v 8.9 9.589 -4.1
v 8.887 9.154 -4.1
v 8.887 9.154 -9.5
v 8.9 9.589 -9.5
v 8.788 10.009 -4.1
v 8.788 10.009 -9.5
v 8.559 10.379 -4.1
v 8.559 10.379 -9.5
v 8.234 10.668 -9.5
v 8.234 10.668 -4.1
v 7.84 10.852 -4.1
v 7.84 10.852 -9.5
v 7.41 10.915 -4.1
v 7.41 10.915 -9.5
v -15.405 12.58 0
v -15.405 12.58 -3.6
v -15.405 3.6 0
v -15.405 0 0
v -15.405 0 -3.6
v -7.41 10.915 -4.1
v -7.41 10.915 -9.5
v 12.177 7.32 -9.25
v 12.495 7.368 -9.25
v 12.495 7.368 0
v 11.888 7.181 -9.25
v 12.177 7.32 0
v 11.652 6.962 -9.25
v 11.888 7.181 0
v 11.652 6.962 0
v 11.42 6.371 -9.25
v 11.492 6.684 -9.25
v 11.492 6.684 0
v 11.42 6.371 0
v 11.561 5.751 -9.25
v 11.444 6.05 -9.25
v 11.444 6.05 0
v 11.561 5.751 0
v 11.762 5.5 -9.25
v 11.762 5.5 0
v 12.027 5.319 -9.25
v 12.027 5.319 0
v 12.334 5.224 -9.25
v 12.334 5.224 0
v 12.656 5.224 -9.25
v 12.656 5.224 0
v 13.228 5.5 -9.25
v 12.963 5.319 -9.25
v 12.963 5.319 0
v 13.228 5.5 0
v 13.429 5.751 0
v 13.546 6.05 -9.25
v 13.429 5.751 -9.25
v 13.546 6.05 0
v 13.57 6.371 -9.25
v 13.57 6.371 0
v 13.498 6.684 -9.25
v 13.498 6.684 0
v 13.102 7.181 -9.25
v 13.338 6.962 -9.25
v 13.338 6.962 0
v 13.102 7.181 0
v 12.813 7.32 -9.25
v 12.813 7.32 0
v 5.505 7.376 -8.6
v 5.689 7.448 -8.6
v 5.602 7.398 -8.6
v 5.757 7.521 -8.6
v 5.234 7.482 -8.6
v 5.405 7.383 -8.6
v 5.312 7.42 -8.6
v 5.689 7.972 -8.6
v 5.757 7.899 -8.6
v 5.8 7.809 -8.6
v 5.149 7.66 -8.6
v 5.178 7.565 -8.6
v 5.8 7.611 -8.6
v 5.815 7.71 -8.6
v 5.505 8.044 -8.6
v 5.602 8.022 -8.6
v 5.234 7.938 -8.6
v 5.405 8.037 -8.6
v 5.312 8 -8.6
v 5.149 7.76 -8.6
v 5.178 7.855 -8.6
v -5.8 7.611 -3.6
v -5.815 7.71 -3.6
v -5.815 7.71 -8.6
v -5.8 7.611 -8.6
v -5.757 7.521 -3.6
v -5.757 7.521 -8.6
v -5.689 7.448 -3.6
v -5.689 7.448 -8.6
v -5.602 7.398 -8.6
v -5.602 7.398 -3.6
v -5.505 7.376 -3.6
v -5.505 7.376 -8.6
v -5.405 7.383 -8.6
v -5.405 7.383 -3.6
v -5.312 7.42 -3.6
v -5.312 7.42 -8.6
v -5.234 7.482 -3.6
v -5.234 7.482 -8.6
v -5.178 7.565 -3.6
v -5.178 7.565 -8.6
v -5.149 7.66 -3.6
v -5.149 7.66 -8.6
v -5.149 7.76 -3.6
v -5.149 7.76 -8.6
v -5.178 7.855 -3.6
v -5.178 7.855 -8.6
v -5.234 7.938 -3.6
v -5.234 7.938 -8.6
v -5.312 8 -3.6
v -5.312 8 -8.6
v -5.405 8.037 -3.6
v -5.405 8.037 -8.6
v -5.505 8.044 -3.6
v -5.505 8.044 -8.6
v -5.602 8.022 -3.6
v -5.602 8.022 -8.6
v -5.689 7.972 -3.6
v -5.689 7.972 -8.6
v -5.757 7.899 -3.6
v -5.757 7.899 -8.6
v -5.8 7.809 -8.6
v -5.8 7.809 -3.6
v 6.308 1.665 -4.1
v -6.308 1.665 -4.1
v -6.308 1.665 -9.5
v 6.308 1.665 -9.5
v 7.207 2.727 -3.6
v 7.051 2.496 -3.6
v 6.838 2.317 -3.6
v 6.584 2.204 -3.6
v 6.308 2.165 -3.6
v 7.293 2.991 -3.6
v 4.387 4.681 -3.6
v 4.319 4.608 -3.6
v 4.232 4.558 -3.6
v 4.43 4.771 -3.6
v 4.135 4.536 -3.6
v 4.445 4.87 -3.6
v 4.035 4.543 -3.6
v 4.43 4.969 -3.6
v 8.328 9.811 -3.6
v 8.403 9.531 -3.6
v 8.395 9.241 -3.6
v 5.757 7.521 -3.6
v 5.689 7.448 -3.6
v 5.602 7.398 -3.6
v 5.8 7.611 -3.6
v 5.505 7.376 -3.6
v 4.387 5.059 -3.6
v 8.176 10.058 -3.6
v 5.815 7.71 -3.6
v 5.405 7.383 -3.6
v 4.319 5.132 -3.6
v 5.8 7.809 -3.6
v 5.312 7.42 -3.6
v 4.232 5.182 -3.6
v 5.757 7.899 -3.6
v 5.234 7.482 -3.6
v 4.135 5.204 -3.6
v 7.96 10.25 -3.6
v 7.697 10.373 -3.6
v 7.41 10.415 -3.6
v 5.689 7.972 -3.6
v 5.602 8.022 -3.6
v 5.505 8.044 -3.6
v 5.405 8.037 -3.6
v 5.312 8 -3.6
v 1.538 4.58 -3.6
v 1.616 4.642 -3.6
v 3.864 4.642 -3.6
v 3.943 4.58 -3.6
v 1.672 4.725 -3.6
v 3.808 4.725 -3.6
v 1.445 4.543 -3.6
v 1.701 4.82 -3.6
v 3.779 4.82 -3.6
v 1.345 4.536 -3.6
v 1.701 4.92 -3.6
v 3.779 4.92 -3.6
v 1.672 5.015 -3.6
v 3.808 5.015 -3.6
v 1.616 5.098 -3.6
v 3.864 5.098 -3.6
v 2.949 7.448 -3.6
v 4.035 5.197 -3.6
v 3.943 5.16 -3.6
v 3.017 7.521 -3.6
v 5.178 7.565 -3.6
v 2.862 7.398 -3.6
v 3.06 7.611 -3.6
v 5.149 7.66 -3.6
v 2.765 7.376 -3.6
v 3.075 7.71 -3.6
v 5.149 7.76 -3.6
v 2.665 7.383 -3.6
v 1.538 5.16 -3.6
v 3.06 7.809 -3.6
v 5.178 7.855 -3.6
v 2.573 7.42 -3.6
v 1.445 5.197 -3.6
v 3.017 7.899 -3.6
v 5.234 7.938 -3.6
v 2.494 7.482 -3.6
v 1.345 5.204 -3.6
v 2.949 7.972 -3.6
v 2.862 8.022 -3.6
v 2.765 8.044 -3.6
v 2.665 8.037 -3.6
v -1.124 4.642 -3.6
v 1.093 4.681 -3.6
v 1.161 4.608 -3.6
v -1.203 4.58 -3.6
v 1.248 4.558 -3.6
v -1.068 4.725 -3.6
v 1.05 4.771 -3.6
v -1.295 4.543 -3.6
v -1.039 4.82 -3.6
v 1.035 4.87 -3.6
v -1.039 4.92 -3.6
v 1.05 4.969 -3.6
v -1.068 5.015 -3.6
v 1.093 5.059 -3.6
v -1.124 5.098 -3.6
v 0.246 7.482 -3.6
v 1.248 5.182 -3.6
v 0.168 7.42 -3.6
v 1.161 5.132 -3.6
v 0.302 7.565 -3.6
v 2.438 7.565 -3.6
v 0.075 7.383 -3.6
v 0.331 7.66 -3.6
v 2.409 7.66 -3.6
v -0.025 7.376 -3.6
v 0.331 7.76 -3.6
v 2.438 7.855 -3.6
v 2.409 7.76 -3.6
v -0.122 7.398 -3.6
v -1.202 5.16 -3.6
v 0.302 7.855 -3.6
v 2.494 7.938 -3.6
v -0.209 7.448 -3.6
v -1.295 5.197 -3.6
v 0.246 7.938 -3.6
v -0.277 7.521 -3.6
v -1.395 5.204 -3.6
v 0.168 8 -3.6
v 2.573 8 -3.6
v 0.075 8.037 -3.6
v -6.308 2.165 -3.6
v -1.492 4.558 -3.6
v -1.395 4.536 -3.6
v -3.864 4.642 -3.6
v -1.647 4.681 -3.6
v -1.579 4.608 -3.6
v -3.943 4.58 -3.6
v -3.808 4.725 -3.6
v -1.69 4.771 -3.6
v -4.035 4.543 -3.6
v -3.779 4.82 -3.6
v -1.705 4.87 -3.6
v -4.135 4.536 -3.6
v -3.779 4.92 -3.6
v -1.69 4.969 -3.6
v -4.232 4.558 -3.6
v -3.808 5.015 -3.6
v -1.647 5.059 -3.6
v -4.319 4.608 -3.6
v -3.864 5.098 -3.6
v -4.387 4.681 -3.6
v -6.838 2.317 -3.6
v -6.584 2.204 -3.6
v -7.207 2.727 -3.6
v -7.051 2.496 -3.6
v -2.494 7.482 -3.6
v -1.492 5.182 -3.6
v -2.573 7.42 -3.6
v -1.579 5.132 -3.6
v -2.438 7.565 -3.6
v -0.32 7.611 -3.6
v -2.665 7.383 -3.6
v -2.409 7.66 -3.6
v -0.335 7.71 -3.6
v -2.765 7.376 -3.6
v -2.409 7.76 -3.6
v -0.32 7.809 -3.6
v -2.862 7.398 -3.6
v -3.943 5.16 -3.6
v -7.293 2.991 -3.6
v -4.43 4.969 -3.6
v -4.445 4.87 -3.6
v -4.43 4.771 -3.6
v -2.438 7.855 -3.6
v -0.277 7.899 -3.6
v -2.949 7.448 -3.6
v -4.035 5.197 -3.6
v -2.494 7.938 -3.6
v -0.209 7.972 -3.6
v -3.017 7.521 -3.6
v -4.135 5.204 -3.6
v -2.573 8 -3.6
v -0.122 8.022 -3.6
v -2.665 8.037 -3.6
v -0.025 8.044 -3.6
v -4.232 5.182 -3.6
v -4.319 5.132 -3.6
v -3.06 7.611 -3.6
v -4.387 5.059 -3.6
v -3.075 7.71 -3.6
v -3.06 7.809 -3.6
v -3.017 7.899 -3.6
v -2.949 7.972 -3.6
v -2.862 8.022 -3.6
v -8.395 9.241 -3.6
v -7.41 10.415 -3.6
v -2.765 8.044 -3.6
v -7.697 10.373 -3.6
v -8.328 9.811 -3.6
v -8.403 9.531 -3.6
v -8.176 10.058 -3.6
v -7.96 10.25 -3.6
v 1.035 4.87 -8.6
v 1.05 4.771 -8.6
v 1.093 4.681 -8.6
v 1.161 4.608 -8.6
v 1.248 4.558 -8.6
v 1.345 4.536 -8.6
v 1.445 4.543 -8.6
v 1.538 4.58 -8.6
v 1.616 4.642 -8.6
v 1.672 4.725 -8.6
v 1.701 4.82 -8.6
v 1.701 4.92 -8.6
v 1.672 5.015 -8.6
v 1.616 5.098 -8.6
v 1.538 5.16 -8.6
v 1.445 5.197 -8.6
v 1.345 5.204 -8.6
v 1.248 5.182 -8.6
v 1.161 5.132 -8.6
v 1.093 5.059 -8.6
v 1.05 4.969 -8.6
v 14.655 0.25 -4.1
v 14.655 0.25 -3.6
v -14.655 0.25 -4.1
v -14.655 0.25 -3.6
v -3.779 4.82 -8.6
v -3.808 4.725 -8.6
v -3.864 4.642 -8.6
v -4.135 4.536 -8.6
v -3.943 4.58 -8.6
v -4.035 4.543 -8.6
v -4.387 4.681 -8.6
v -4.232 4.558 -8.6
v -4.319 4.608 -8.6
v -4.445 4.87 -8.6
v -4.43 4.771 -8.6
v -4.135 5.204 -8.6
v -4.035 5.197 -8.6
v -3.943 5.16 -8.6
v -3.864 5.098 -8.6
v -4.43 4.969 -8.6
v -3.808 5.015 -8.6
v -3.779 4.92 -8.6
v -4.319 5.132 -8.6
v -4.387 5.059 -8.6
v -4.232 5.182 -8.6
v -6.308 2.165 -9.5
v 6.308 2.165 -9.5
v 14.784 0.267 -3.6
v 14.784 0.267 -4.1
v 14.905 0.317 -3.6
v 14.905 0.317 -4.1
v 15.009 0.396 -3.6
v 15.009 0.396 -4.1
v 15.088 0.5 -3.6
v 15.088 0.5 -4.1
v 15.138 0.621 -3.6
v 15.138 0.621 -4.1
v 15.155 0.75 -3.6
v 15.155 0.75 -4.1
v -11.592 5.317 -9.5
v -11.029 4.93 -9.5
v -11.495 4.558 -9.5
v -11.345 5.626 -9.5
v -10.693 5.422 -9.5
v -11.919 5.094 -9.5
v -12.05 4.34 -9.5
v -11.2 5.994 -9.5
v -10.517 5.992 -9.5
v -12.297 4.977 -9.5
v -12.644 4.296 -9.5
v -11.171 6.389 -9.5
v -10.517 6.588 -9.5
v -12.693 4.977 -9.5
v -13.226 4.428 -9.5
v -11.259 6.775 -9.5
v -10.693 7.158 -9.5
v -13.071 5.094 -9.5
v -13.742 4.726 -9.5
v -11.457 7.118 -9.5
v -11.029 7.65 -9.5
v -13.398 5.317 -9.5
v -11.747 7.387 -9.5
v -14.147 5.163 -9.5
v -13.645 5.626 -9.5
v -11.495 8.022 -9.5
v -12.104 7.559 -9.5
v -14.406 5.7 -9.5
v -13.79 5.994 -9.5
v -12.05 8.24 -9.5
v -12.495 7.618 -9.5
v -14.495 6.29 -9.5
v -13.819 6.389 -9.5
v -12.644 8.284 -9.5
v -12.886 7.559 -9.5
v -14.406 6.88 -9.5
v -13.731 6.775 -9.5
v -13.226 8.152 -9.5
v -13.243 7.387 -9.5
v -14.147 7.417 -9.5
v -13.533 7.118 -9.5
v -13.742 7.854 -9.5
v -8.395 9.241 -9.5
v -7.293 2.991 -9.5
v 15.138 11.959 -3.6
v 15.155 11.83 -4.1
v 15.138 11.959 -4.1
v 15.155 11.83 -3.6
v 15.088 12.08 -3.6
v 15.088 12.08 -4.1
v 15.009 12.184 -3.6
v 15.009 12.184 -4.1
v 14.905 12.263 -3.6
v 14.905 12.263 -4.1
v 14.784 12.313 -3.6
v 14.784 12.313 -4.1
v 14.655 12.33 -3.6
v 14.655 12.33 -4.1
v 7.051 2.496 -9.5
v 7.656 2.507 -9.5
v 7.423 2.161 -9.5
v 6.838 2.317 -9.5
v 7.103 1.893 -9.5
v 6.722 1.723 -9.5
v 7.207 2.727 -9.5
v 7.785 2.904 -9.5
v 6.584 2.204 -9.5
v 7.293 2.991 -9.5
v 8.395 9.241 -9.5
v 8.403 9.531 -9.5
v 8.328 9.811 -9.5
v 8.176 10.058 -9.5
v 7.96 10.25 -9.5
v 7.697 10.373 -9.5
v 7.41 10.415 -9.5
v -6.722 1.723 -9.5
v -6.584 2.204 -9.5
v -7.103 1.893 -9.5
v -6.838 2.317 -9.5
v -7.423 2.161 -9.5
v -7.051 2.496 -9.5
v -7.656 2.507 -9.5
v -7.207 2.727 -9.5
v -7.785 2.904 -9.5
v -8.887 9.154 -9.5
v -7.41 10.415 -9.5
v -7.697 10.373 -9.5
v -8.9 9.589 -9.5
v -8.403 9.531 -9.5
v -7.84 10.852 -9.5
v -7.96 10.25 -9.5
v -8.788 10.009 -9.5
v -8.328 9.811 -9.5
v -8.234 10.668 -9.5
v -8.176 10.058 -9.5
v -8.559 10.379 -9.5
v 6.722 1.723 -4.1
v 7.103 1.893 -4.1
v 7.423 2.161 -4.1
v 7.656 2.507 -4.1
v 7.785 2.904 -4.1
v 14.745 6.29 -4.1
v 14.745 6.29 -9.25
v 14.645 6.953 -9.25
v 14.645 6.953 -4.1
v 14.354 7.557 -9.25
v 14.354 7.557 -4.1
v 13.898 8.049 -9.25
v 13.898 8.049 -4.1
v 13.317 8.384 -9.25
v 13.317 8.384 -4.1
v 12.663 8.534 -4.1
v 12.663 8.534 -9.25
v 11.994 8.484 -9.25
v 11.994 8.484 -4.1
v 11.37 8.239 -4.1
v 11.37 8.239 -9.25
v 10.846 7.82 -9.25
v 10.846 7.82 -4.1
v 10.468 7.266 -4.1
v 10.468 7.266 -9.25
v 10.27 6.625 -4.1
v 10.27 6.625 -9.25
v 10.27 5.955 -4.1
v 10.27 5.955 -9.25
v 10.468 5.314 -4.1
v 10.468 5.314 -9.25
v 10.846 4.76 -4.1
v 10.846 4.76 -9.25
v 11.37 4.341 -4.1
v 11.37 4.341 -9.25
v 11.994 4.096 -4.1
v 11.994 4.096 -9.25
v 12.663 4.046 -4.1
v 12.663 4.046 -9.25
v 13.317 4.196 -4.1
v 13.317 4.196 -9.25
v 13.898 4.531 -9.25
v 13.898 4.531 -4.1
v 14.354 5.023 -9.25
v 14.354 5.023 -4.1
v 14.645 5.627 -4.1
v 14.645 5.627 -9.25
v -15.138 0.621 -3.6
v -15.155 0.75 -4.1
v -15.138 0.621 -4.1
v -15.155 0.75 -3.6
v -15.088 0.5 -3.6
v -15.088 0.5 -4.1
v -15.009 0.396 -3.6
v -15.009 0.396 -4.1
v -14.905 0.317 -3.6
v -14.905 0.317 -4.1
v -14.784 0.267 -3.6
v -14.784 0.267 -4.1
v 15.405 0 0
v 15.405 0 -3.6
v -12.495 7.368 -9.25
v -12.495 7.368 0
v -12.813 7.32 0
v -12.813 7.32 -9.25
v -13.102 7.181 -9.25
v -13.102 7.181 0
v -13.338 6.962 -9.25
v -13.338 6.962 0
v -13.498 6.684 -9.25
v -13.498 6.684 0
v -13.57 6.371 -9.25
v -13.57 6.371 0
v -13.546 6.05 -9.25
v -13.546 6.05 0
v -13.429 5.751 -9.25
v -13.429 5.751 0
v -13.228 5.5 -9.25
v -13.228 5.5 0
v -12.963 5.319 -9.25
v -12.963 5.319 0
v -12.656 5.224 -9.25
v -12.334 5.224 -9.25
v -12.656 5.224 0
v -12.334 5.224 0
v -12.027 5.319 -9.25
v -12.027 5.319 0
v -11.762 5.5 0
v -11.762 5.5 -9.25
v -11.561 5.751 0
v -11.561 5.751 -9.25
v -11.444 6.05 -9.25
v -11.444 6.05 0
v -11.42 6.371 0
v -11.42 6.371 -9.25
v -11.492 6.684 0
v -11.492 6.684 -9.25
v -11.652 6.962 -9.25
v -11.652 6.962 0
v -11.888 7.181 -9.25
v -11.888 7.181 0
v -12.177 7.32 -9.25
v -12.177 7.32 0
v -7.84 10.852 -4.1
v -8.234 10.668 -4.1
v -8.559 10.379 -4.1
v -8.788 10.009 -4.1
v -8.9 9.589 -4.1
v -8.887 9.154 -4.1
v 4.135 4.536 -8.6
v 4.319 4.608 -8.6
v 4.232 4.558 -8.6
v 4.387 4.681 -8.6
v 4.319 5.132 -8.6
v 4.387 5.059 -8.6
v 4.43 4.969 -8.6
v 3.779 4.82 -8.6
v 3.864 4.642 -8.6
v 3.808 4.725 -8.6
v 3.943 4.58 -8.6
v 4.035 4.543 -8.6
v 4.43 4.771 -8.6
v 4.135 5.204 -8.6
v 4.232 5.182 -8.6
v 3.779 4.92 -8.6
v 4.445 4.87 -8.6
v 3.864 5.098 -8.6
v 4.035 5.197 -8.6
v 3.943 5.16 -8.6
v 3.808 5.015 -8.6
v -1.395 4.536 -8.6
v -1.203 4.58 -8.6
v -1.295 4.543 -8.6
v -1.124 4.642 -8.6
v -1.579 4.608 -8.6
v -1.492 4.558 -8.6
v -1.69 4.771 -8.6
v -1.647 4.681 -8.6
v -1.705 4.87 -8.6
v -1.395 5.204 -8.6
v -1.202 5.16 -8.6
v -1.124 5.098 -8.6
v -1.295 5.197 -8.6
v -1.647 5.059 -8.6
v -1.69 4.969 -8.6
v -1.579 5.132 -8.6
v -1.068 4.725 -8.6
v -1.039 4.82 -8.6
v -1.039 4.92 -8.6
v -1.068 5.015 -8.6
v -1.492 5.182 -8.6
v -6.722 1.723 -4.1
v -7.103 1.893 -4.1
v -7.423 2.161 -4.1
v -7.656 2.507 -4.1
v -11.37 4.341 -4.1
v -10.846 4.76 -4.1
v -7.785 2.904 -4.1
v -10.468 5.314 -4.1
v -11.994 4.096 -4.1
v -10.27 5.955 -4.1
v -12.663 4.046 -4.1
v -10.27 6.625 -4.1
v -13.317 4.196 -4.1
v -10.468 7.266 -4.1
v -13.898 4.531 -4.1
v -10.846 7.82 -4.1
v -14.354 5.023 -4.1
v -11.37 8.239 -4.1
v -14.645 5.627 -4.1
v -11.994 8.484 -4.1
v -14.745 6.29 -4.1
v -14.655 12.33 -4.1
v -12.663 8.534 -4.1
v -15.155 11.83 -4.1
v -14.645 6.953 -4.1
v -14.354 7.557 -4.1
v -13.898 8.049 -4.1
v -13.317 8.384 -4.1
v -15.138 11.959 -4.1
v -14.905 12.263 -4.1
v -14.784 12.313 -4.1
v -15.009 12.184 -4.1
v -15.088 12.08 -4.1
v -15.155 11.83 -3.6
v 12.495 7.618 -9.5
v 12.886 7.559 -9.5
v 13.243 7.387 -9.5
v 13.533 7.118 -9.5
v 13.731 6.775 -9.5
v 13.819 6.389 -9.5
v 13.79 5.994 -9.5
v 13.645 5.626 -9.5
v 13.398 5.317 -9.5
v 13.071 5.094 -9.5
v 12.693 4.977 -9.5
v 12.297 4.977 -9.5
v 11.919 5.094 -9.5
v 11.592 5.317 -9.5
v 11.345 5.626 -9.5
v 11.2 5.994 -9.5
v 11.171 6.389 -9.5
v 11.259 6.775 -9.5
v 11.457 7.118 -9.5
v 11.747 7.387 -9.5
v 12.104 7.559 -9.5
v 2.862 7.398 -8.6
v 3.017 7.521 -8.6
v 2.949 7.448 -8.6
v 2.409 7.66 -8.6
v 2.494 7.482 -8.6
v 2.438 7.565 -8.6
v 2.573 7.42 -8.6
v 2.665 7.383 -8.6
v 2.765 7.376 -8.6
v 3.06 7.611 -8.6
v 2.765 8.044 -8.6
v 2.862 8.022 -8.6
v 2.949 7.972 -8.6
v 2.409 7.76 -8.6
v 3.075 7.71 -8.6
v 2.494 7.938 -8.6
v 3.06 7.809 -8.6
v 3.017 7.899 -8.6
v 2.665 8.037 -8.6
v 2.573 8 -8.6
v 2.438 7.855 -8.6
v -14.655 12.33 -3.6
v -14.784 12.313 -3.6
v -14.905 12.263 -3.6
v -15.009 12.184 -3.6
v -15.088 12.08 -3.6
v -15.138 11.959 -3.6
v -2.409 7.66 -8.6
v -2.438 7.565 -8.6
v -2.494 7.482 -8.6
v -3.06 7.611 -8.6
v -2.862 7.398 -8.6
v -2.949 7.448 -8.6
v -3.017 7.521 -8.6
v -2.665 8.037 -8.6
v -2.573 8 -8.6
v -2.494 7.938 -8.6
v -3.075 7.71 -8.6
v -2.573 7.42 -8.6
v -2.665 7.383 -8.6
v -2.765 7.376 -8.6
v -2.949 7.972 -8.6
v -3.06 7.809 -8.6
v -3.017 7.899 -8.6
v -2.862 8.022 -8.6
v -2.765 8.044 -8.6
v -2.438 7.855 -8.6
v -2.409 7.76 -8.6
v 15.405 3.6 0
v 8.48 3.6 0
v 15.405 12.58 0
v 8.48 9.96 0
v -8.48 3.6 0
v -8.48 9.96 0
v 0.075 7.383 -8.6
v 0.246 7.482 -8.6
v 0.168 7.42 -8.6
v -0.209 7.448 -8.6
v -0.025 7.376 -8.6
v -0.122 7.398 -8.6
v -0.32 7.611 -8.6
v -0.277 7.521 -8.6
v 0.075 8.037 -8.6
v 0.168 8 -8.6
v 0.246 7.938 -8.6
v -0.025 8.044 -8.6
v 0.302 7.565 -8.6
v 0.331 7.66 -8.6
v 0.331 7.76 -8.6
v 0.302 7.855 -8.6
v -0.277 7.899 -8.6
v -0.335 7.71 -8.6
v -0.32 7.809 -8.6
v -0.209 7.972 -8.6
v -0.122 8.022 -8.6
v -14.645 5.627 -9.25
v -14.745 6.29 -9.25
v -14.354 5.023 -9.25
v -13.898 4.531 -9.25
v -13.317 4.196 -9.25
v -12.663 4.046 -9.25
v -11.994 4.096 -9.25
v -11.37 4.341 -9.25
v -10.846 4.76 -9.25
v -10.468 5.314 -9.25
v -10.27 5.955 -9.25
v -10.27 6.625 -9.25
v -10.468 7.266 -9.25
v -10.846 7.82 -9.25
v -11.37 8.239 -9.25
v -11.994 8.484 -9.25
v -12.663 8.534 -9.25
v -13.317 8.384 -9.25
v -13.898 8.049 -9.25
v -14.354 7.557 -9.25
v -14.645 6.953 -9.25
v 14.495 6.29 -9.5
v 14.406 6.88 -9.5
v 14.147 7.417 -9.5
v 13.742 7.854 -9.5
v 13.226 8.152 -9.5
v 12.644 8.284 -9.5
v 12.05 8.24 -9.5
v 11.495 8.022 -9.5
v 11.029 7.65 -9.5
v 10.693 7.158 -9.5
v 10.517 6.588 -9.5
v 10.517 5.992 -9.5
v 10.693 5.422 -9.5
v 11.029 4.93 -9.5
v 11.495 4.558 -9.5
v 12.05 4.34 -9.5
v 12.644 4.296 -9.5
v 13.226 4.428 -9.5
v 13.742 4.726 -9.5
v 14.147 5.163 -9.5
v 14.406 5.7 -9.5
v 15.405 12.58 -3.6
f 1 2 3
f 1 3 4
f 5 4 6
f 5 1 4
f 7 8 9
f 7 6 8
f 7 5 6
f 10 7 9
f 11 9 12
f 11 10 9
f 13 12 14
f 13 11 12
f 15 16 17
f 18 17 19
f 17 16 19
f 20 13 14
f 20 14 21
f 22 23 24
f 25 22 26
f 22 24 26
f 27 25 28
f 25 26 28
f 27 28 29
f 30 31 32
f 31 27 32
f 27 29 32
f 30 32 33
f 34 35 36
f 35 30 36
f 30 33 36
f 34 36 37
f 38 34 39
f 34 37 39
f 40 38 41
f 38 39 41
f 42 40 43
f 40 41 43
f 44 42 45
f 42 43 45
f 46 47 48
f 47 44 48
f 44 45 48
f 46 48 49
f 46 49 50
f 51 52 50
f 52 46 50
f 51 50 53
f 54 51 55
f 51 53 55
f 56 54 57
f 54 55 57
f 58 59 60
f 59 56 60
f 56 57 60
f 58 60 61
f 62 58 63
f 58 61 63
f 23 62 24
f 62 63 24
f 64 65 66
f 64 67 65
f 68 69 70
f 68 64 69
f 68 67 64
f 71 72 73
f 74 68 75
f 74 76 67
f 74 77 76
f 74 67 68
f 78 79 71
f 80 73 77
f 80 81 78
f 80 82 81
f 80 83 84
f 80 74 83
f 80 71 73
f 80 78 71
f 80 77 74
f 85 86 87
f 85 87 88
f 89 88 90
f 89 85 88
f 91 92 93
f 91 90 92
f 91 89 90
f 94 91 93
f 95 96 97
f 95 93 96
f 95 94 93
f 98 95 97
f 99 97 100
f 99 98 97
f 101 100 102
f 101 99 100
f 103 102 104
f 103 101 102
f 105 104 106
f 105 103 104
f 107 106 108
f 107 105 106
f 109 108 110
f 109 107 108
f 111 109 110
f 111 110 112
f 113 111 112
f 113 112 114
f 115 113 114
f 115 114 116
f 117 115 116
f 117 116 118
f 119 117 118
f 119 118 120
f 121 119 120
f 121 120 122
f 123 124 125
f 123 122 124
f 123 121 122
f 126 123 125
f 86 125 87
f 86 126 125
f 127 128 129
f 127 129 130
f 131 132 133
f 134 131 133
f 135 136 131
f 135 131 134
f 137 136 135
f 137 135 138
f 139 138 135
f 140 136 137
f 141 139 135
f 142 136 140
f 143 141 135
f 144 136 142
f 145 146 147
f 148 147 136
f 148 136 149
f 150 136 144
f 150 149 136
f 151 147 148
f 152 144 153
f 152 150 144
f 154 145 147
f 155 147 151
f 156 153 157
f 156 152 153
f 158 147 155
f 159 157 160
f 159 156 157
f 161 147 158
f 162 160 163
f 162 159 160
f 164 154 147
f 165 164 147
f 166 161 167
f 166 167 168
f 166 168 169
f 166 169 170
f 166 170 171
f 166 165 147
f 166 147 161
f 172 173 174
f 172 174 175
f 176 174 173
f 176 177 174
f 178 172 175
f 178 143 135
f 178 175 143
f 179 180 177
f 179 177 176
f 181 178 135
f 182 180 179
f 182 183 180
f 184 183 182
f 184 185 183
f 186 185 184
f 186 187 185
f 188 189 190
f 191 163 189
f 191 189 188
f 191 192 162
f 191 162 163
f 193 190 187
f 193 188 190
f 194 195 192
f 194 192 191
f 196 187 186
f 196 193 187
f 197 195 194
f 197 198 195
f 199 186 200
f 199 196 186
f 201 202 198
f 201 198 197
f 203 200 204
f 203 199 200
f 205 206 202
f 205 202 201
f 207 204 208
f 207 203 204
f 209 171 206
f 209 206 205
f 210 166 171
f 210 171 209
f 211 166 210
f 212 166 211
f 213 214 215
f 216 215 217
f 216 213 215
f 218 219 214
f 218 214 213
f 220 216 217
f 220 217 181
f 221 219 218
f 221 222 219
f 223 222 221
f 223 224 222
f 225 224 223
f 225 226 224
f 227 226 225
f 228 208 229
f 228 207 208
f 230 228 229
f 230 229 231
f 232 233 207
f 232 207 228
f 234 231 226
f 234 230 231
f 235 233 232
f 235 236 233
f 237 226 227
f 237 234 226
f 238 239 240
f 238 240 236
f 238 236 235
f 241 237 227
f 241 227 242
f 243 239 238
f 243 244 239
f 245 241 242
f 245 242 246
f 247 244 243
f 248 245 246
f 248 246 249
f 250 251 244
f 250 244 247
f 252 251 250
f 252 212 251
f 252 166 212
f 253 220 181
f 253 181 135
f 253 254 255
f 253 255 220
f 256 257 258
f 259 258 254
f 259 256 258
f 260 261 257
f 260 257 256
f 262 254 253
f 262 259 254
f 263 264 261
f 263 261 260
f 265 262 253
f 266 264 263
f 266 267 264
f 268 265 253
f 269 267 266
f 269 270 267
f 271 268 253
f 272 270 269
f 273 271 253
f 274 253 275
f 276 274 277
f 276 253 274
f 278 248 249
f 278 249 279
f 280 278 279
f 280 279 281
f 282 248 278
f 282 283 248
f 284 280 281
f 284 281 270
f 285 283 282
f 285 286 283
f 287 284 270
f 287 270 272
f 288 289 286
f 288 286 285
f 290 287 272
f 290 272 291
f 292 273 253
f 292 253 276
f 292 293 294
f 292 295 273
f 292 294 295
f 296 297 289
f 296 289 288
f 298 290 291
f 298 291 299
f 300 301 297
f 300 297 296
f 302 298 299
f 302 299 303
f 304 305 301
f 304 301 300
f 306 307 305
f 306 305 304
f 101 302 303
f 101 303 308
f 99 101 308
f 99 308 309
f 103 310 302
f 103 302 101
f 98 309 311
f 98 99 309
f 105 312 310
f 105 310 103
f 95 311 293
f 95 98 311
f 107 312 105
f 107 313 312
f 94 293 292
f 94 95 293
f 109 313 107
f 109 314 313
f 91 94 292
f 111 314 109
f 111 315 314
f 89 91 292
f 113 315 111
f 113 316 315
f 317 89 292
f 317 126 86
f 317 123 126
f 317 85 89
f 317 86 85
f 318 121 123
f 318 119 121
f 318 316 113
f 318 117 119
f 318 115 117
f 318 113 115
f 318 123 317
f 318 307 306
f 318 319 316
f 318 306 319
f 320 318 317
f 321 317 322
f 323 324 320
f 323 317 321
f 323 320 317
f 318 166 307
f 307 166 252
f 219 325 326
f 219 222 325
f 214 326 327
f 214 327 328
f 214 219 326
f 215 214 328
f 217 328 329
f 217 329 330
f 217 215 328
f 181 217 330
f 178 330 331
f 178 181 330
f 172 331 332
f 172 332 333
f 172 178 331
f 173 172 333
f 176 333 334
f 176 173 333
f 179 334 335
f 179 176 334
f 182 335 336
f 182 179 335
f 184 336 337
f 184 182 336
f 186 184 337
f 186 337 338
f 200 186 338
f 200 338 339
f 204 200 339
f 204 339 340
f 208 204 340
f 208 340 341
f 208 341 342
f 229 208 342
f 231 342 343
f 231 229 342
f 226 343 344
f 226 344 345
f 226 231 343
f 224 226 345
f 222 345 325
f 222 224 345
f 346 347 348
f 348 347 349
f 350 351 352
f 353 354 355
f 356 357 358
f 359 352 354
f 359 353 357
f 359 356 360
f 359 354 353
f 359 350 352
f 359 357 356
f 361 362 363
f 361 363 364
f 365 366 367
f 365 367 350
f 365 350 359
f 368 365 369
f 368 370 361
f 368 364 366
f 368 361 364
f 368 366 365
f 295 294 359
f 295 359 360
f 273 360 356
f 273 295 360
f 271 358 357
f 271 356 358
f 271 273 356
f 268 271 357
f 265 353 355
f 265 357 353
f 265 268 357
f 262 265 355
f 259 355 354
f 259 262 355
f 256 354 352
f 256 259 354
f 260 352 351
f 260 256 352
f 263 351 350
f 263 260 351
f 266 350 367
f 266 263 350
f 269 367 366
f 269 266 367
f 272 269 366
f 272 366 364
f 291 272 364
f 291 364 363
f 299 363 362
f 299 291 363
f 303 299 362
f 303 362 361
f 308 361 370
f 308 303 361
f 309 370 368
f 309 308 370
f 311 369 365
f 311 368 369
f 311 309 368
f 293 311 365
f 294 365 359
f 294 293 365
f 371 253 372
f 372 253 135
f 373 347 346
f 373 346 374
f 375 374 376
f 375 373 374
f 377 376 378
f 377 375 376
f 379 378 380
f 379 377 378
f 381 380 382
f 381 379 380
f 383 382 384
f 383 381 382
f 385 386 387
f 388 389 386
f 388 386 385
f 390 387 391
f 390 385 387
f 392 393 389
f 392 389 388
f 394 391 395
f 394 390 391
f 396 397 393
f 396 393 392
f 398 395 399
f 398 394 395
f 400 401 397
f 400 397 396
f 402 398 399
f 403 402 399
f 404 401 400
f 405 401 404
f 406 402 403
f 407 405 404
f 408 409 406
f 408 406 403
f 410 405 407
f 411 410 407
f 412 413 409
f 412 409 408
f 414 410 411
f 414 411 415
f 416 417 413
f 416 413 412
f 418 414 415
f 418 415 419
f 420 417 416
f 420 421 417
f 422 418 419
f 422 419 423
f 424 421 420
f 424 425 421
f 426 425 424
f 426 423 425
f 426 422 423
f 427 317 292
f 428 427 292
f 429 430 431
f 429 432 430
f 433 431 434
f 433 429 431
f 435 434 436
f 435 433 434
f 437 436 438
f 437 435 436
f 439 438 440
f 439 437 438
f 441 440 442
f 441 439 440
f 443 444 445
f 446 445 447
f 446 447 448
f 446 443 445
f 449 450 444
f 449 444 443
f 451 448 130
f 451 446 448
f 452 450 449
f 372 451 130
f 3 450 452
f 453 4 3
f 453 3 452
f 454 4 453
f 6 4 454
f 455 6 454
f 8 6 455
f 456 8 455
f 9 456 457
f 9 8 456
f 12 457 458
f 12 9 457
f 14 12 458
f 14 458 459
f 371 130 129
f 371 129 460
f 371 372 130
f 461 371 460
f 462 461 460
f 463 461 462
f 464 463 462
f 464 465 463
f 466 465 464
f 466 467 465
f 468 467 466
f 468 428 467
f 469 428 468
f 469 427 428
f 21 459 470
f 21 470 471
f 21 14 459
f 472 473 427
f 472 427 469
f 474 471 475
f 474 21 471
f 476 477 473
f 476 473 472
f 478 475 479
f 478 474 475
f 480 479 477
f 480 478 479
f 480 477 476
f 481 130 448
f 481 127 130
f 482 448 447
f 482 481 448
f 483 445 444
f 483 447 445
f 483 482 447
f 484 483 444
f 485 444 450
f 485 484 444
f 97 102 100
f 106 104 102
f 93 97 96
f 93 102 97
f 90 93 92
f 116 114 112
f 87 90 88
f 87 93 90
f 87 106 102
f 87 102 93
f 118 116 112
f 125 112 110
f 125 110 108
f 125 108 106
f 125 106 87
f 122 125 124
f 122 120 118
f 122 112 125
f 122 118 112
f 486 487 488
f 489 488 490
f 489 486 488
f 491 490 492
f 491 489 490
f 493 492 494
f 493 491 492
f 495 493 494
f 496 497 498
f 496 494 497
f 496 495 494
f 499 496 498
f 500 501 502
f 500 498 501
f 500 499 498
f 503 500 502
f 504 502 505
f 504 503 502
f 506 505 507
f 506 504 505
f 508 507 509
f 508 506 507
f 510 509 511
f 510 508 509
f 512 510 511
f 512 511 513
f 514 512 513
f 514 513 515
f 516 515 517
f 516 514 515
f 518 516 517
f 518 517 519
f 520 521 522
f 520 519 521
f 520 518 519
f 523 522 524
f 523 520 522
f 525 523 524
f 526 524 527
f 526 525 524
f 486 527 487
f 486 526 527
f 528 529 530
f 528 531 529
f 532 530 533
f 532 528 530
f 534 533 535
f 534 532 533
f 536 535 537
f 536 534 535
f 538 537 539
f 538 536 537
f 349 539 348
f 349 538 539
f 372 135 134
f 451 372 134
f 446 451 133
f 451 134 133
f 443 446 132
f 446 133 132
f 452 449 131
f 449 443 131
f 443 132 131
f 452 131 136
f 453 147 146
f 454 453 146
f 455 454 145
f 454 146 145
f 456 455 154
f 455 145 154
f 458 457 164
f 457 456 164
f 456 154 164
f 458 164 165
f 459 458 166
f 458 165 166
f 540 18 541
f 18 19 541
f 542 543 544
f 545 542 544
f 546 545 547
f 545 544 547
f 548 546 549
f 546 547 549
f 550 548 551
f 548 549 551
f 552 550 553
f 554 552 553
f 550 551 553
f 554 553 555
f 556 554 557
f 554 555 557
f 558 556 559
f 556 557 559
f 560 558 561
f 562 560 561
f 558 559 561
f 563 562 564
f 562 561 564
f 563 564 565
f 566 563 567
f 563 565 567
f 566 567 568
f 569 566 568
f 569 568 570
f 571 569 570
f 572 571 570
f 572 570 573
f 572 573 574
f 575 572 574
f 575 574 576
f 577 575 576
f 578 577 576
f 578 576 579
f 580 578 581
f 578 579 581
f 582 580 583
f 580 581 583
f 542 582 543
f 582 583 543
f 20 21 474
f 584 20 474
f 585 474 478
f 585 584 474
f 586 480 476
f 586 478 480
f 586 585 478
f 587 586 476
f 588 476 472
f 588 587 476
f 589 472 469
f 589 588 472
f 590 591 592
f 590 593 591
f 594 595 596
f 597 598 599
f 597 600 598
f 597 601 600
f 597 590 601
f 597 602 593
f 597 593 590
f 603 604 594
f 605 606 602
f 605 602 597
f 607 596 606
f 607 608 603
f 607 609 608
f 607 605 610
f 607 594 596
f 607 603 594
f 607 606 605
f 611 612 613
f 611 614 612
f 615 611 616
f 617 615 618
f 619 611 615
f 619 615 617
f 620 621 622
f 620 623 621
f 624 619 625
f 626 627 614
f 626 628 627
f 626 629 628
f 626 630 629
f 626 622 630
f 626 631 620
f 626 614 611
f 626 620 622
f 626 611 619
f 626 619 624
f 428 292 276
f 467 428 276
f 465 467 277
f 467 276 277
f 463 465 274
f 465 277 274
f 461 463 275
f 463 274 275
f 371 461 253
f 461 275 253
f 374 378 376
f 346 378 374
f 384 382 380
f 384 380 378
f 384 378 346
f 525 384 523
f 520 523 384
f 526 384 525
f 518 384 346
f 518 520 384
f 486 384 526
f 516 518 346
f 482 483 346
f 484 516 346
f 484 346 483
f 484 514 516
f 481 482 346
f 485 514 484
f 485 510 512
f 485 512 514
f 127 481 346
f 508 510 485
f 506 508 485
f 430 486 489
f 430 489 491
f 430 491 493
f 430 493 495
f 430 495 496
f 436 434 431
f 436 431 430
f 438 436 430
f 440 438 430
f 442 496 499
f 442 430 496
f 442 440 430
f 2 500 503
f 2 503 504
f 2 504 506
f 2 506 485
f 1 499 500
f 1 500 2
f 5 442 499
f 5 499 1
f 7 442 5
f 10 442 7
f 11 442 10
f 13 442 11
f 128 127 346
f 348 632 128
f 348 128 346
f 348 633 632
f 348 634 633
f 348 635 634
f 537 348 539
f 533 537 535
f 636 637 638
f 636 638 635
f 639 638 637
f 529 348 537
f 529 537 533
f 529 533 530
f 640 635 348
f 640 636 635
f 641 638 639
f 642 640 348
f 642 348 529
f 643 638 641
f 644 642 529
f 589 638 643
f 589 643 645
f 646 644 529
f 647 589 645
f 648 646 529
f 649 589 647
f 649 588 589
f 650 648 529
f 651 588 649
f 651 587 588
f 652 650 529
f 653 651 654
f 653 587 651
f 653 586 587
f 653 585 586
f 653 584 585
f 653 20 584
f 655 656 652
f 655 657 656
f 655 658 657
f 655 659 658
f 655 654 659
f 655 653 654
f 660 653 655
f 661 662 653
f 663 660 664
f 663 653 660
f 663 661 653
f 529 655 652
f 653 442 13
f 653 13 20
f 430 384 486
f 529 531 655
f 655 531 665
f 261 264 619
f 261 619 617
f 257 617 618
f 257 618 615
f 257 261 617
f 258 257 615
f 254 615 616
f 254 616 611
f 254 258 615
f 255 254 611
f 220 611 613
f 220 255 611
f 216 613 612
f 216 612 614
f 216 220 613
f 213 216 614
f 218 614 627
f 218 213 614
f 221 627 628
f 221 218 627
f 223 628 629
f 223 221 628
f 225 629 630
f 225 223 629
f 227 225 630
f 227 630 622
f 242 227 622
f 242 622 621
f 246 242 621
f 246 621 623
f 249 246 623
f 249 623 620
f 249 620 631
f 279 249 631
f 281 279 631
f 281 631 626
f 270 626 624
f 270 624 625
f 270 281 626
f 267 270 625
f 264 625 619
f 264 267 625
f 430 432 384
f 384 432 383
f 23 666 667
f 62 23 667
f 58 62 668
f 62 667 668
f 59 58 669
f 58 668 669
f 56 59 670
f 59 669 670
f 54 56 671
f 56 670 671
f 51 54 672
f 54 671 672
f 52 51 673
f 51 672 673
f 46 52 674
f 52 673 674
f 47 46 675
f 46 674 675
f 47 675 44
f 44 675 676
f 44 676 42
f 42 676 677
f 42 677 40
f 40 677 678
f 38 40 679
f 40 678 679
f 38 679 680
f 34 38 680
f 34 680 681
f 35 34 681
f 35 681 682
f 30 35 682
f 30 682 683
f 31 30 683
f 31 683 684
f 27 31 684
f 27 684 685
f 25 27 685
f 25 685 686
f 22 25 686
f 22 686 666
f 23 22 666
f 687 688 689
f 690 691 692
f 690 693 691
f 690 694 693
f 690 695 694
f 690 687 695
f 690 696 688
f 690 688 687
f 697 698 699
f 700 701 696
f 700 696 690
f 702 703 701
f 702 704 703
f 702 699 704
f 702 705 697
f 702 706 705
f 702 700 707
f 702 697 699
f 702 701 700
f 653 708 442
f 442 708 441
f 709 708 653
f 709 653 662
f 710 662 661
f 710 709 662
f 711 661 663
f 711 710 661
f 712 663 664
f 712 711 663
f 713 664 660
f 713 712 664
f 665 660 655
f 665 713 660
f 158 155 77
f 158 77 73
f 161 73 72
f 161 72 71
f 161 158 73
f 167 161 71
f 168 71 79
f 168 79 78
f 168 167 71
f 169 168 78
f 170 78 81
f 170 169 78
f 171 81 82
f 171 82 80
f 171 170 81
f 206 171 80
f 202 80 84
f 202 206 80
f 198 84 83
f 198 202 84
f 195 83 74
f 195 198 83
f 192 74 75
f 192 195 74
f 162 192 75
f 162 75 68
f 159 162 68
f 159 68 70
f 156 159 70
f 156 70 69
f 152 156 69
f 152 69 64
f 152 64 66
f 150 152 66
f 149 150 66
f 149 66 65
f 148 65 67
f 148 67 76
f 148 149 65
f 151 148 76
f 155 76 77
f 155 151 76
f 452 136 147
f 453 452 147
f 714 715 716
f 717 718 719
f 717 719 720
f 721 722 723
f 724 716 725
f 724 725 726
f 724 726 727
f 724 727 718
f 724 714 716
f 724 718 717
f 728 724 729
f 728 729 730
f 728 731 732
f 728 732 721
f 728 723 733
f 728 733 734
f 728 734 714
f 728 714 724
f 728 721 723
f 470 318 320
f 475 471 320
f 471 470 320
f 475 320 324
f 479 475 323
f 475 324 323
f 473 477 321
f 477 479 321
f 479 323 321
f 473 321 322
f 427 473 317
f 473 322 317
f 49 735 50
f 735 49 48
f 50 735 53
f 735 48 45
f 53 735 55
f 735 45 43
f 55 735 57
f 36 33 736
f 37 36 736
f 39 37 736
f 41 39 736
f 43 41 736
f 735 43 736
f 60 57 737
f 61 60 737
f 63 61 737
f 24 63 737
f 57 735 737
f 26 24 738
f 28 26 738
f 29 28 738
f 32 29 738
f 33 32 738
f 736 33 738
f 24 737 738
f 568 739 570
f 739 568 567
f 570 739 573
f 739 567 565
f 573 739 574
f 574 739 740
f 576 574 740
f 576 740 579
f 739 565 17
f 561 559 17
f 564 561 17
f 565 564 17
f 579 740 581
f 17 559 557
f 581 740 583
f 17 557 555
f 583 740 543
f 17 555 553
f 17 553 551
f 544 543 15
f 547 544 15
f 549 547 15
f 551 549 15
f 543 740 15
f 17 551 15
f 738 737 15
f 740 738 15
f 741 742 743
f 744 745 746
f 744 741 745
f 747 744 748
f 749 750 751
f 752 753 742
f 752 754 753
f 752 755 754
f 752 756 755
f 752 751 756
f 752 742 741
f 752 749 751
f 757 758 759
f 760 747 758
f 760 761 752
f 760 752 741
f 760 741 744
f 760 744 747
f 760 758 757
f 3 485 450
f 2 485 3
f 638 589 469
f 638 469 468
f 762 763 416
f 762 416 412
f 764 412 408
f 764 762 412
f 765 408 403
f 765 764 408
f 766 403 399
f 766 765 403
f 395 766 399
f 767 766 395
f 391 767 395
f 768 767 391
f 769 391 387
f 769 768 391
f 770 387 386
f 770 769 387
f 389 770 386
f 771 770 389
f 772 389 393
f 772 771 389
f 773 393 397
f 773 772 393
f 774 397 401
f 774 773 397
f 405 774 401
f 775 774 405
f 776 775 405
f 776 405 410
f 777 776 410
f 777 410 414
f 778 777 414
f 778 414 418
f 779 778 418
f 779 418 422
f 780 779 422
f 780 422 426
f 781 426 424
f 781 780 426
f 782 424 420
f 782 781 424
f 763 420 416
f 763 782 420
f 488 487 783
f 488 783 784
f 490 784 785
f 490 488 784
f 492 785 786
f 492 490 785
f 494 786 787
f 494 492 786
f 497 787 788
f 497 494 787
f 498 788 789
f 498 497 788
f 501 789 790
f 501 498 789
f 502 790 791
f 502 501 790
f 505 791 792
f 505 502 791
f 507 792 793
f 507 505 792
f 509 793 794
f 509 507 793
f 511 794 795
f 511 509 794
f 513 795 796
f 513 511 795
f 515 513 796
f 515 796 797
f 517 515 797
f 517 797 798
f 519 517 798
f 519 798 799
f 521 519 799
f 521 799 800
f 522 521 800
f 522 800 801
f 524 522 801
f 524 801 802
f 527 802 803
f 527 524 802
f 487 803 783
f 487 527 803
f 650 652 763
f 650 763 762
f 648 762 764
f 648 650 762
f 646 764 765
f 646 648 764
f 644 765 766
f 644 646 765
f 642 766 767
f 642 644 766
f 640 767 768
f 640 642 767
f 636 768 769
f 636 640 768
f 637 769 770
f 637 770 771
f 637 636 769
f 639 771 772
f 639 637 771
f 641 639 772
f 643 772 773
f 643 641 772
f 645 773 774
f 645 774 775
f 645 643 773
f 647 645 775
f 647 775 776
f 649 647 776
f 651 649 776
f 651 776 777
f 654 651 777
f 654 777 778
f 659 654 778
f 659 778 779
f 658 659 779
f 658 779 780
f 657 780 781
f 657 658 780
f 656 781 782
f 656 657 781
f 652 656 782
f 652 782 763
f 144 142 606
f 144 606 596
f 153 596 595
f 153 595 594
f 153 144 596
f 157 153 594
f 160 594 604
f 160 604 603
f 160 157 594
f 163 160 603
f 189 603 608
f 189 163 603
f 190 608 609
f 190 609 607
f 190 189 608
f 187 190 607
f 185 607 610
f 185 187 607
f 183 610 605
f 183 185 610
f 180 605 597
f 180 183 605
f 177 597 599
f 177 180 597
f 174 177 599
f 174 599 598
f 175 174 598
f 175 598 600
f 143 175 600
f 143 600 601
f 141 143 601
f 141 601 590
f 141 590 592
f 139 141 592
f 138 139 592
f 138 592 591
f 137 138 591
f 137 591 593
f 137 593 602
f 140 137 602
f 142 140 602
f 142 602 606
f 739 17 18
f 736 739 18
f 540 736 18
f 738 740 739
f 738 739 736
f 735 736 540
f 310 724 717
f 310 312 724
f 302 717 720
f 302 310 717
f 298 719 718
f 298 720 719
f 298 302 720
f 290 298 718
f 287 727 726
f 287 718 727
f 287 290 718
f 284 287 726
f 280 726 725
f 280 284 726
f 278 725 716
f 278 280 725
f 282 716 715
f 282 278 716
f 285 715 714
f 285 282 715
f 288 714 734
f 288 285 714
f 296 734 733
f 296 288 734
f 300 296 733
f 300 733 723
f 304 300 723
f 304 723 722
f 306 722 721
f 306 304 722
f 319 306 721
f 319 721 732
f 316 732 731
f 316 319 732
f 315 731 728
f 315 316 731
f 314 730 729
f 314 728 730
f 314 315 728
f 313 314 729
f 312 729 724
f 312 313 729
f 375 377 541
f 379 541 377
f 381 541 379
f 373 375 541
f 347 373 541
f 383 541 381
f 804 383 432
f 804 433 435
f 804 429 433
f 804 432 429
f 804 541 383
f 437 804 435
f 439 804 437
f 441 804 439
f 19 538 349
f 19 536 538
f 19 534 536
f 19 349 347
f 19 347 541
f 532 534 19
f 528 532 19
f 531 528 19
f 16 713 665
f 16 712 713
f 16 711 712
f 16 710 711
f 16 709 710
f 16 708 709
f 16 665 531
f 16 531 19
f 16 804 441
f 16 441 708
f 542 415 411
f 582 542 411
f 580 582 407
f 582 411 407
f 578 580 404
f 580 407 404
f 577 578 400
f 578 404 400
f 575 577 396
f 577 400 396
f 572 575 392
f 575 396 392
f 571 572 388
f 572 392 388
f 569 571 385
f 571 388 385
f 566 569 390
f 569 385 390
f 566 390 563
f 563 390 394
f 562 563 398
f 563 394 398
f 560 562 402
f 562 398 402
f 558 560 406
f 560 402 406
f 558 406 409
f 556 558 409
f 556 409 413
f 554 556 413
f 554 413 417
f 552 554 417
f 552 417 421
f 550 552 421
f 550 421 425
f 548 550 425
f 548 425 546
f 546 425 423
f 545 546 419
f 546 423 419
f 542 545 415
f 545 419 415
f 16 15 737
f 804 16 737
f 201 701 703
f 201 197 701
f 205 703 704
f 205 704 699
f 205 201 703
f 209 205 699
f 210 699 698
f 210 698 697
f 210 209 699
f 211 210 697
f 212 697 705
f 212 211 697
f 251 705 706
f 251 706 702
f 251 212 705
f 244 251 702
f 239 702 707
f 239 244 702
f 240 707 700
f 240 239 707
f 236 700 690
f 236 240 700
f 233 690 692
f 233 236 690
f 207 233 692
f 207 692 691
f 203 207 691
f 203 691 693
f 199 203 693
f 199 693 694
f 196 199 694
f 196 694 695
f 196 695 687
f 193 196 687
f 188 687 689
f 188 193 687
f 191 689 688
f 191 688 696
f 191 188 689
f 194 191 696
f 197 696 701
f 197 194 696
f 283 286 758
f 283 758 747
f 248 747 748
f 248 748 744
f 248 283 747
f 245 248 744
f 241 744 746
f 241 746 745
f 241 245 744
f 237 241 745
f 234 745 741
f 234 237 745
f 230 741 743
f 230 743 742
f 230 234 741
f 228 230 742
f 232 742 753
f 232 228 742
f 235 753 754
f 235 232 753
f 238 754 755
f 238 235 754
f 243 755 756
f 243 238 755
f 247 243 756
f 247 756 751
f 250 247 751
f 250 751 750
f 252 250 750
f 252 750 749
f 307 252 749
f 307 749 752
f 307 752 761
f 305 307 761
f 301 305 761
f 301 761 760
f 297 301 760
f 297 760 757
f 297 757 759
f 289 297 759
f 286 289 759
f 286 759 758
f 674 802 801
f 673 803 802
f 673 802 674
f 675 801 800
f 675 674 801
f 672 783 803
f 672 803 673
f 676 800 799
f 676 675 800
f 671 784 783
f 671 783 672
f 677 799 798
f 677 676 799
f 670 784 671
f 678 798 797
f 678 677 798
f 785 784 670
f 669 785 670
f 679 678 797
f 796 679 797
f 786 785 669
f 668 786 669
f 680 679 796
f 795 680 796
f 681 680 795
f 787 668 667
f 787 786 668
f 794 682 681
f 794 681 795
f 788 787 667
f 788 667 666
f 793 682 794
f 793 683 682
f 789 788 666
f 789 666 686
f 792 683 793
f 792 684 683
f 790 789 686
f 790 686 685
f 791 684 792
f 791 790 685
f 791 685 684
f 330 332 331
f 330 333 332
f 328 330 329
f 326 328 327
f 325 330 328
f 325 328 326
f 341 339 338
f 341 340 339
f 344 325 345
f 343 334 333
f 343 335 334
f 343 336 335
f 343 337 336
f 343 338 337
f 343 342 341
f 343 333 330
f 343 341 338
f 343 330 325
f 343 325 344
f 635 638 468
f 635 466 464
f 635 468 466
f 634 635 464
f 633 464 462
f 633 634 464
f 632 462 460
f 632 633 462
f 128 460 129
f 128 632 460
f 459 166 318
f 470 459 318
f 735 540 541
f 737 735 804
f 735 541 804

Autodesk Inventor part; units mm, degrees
ref_plane "YZ Plane" through (0, 0, 0) normal (1, 0, 0) x (0, 1, 0)
ref_plane "XZ Plane" through (0, 0, 0) normal (0, 1, 0) x (-1, 0, 0)
ref_plane "XY Plane" through (0, 0, 0) normal (0, 0, 1) x (1, 0, 0)
sketch "Sketch1" plane through (0, 0, 0) normal (0, 0, 1) x (1, 0, 0)
  line L0 (-15.405, 0) -> (15.405, 0)
  line L1 (15.405, 0) -> (15.405, 3.6)
  line L2 (15.405, 3.6) -> (8.48, 3.6)
  line L3 (8.48, 3.6) -> (8.48, 9.96)
  line L4 (8.48, 9.96) -> (-8.48, 9.96)
  line L5 (-8.48, 9.96) -> (-8.48, 3.6)
  line L6 (-8.48, 3.6) -> (-15.405, 3.6)
  line L7 (-15.405, 3.6) -> (-15.405, 0)
  point P0 (0, 0)
  point P1 (0, 0)
  dimension "d0" = 16.96
  dimension "d1" = 9.96
  dimension "d2" = 3.6
  dimension "d3" = 30.81
extrude "Extrusion1" add sketch "Sketch1" along normal blind 0.0001
sketch "Sketch2" plane through (0, 0, 0) normal (0, 0, -1) x (-1, 0, 0)
  line L0 (15.405, 3.6) -> (15.405, 0) projected
  line L1 (-15.405, 0) -> (15.405, 0)
  line L2 (15.405, 0) -> (15.405, 12.58)
  line L3 (15.405, 12.58) -> (-15.405, 12.58)
  line L4 (-15.405, 12.58) -> (-15.405, 0)
  dimension "d6" = 12.58
extrude "Extrusion2" add sketch "Sketch2" along normal blind 3.6
sketch "Sketch5" plane through (0, 0, -3.6) normal (0, 0, -1) x (-1, 0, 0)
  line L0 (15.405, 0) -> (-15.405, 0) projected
  line L1 (-15.405, 12.58) -> (15.405, 12.58) projected
  line L2 (-7.4102, 10.415) -> (7.4102, 10.415)
  line L3 (8.395, 9.2414) -> (7.293, 2.9914)
  line L4 (6.3081, 2.165) -> (-6.3081, 2.165)
  line L5 (-7.293, 2.9914) -> (-8.395, 9.2414)
  arc A0 (-7.4102, 10.415) -> (-8.395, 9.2414) centre (-7.4102, 9.415) ccw
  arc A1 (8.395, 9.2414) -> (7.4102, 10.415) centre (7.4102, 9.415) ccw
  arc A2 (-7.293, 2.9914) -> (-6.3081, 2.165) centre (-6.3081, 3.165) ccw
  arc A3 (6.3081, 2.165) -> (7.293, 2.9914) centre (6.3081, 3.165) ccw
  line L6 (0, 12.58) -> (0, 0) construction
  line L7 (0, 10.415) -> (0, 12.58) construction
  line L8 (0, 0) -> (0, 2.165) construction
  arc A4 (-7.4102, 10.915) -> (-8.8874, 9.1545) centre (-7.4102, 9.415) ccw
  line L9 (-7.4102, 10.915) -> (7.4102, 10.915)
  arc A5 (8.8874, 9.1545) -> (7.4102, 10.915) centre (7.4102, 9.415) ccw
  line L10 (8.8874, 9.1545) -> (7.7854, 2.9045)
  arc A6 (6.3081, 1.665) -> (7.7854, 2.9045) centre (6.3081, 3.165) ccw
  line L11 (6.3081, 1.665) -> (-6.3081, 1.665)
  arc A7 (-7.7854, 2.9045) -> (-6.3081, 1.665) centre (-6.3081, 3.165) ccw
  line L12 (-7.7854, 2.9045) -> (-8.8874, 9.1545)
  dimension "d22" = 100
  dimension "d23" = 100
  dimension "d24" = 1
  dimension "d25" = 1
  dimension "d26" = 8.25
  dimension "d27" = 16.79
  dimension "d29" = 0.5
extrude "Extrusion3" add sketch "Sketch5" along normal blind 5.9
sketch "Sketch6" plane through (0, 0, -3.6) normal (0, 0, -1) x (-1, 0, 0)
  line L0 (-15.405, 0) -> (-15.405, 12.58) projected
  line L1 (15.405, 0) -> (-15.405, 0) projected
  line L2 (15.405, 12.58) -> (15.405, 0) projected
  line L3 (-15.405, 12.58) -> (15.405, 12.58) projected
  line L4 (-7.4102, 10.915) -> (7.4102, 10.915) projected
  arc A0 (8.8874, 9.1545) -> (7.4102, 10.915) centre (7.4102, 9.415) ccw projected
  line L5 (8.8874, 9.1545) -> (7.7854, 2.9045) projected
  arc A1 (6.3081, 1.665) -> (7.7854, 2.9045) centre (6.3081, 3.165) ccw projected
  line L6 (6.3081, 1.665) -> (-6.3081, 1.665) projected
  arc A2 (-7.7854, 2.9045) -> (-6.3081, 1.665) centre (-6.3081, 3.165) ccw projected
  line L7 (-7.7854, 2.9045) -> (-8.8874, 9.1545) projected
  arc A3 (-7.4102, 10.915) -> (-8.8874, 9.1545) centre (-7.4102, 9.415) ccw projected
  line L8 (-15.155, 11.83) -> (-15.155, 0.75)
  line L9 (-14.655, 0.25) -> (14.655, 0.25)
  line L10 (15.155, 0.75) -> (15.155, 11.83)
  line L11 (14.655, 12.33) -> (-14.655, 12.33)
  line L12 (-8.395, 9.2414) -> (-7.293, 2.9914) projected
  arc A4 (-7.293, 2.9914) -> (-6.3081, 2.165) centre (-6.3081, 3.165) ccw projected
  line L13 (-6.3081, 2.165) -> (6.3081, 2.165) projected
  arc A5 (-14.655, 12.33) -> (-15.155, 11.83) centre (-14.655, 11.83) ccw
  arc A6 (15.155, 11.83) -> (14.655, 12.33) centre (14.655, 11.83) ccw
  arc A7 (14.655, 0.25) -> (15.155, 0.75) centre (14.655, 0.75) ccw
  arc A8 (-15.155, 0.75) -> (-14.655, 0.25) centre (-14.655, 0.75) ccw
  dimension "d32" = 0.25
  dimension "d33" = 0.5
extrude "Extrusion4" add sketch "Sketch6" along normal blind 0.5 contours A5 L11 A6 L10 A7 L9 A8 L8
sketch "Sketch7" plane through (0, 0, -4.1) normal (0, 0, -1) x (-1, 0, 0)
  line L0 (-14.655, 12.33) -> (14.655, 12.33) projected
  line L1 (14.655, 0.25) -> (-14.655, 0.25) projected
  circle A0 centre (12.495, 6.29) radius 2.25
  line L2 (12.495, 6.29) -> (12.495, 12.33)
  line L3 (12.495, 6.29) -> (12.495, 0.25)
  line L4 (15.405, 12.58) -> (15.405, 0) projected
  dimension "d36" = 4.5
  dimension "d37" = 2.91
extrude "Extrusion5" add sketch "Sketch7" along normal blind 5.4
sketch "Sketch8" plane through (-12.495, 6.29, -9.5) normal (0, 0, -1) x (-1, 0, 0)
  circle A0 centre (0, 0) radius 2.25 projected
hole "Hole2" at (-12.495, 6.29, -9.5) direction (0, 0, 1) diameter 2.156 end through all thread size "4-40 UNC" class "2B" standard "ANSI Unified Screw Threads"
chamfer "Chamfer2" distance 0.25 angle 45 2 edges at (-10.245, 6.29, -9.5) (-12.495, 5.212, -9.5)
mirror "Mirror2" about plane through (0, 0, 0) normal (1, 0, 0) of "Extrusion5", "Hole2", "Chamfer2"
sketch "Sketch9" plane through (0, 0, -3.6) normal (0, 0, -1) x (-1, 0, 0)
  line L0 (7.4102, 10.415) -> (-7.4102, 10.415) projected
  line L1 (-6.3081, 2.165) -> (6.3081, 2.165) projected
  line L2 (0, 2.165) -> (0, 10.415) construction
  line L3 (-1.7032, 7.71) -> (6.4948, 7.71) construction
  line L4 (-1.5161, 4.87) -> (6.4574, 4.87) construction
  line L5 (-1.7032, 7.71) -> (-1.7032, 10.415) construction
  line L6 (-1.5161, 4.87) -> (-1.5161, 2.165) construction
  line L7 (-1.37, 8.1856) -> (-1.37, 4.0304) construction
  circle A0 centre (0, 7.71) radius 0.335
  circle A1 centre (-1.37, 4.87) radius 0.335
  circle A2 centre (2.74, 7.71) radius 0.335
  circle A3 centre (1.37, 4.87) radius 0.335
  circle A4 centre (5.48, 7.71) radius 0.335
  circle A5 centre (4.11, 4.87) radius 0.335
  dimension "d49" = 2.84
  dimension "d50" = 1.37
  dimension "d51" = 0.67
  dimension "d54" = 2.74
extrude "Extrusion6" add sketch "Sketch9" along normal blind 5
mirror "Mirror3" about plane through (0, 0, 0) normal (1, 0, 0) of "Extrusion6"
properties part number "cRIO-FRC 9M D-Shell" material "ABS Plastic"
